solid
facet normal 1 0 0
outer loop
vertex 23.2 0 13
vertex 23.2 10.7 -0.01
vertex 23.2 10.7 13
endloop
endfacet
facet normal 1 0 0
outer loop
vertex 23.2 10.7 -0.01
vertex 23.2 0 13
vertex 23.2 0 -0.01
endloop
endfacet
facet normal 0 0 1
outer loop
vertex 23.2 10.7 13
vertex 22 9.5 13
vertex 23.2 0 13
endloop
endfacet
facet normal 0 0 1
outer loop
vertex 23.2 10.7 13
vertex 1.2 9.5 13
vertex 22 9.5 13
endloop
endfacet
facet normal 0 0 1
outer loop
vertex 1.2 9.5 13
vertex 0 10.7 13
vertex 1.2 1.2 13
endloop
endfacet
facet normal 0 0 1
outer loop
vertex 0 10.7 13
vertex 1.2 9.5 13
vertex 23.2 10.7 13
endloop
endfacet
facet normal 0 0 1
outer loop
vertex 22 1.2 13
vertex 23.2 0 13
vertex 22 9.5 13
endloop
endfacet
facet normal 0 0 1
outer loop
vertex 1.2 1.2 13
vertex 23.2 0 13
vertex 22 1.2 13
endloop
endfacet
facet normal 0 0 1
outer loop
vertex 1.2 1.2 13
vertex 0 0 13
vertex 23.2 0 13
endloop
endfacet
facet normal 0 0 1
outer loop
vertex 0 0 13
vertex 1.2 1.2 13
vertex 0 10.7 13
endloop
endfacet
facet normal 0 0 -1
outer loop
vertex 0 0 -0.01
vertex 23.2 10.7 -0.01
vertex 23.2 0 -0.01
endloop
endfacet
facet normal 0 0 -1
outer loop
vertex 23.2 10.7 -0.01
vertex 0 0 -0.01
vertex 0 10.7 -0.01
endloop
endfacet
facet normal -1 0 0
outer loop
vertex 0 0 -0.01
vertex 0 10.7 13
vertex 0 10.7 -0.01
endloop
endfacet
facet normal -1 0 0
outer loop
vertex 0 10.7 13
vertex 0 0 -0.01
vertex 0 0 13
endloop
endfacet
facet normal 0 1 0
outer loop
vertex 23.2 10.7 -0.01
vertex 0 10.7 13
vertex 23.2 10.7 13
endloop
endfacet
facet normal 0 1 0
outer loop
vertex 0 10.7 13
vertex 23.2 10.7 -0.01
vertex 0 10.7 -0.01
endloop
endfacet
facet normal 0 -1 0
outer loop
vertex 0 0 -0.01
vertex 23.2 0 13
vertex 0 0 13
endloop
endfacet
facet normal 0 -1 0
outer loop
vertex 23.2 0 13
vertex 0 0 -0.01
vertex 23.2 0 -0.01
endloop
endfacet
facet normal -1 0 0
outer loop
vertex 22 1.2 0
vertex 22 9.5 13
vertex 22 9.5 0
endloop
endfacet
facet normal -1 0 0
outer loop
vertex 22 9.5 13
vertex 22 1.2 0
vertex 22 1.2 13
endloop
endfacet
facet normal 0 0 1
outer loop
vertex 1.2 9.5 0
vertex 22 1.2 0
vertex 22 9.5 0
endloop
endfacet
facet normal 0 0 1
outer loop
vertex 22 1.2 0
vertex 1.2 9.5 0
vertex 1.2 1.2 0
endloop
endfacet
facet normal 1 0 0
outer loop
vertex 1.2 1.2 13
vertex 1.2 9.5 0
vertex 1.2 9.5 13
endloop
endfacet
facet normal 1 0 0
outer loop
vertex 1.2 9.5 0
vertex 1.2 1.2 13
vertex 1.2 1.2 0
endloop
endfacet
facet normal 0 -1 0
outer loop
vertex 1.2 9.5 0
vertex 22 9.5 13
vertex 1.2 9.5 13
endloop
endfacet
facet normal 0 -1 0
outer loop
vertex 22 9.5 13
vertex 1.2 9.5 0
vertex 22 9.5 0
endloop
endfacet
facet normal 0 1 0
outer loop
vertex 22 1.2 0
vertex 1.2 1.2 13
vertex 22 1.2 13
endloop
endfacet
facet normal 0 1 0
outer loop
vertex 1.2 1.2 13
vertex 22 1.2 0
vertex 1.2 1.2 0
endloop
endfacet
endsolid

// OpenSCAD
// file: ../Base/Rotation.scad
// Fischertechnik Box Foundation
// Geometry Helpers Rotation

include <PlacementOptions.scad>

// getRotatedSpace(space, rotation=NoRotation)
// Rotates the space dependent on the specified rotation

function getRotatedSpace(space, rotation=NoRotation) = [
    (rotation == Rotate90 || rotation == Rotate270) ? space.y : space.x,
    (rotation == Rotate90 || rotation == Rotate270) ? space.x : space.y
];

// Rotates the given space around the fixed left lower corner
// space = the space the children needs as width/depth list [width,depth]
// rotation = 0 Rotate0 degrees, 1 Rotate90 degrees, 2 Rotate180 degrees, 3 Rotate270 degrees (equivalent to -90)

module RotateFix(space, rotation=NoRotation) {
    dy = (rotation == Rotate0 || rotation == Rotate270) ? 0 :
        (rotation == Rotate90) ? space.x :
        space.y;
    dx = (rotation < Rotate180) ? 0 :
        (rotation == Rotate180) ? space.x :
        space.y;
    
    translate([dx, dy, 0])
        rotate([0, 0, rotations[rotation]])
            children();
}
// file: ../Base/Alignment.scad
// Fischertechnik Box Foundation
// Geometry Helpers Alignment

include <PlacementOptions.scad>

// getAlignedX(elementWidth, spaceWidth, align=AlignRight, offset=0)
// Gets the aligned X offset of an element with the given
// width in the given space.
// elementWidth = The width of the element to positon
// spaceWidth = The space where the element should be aligned
// align = 0 AlignLeft, 1 AlignCenter, 2 AlignRight
// offset = an optional offset from the aligned position. When
// aligned left or centered, then positive values are in X direction.
// When aligned right then positive values are in negative X direction.

function getAlignedX(elementWidth, spaceWidth, align=AlignRight, offset=0) =
    (align == AlignLeft) ?
        offset :
        ((align == AlignCenter) ?
        (spaceWidth - elementWidth)/2 + offset :
        spaceWidth - offset - elementWidth);

// getAlignedY(elementDepth, spaceDepth, align=AlignTop, offset=0)
// Gets the aligned Y offset of an element with the given
// depth in the given space.
// elementDepth = The depth of the element to positon
// spaceDepth = The space where the element should be aligned
// align = 0 AlignBottom, 1 AlignCenter, 2 AlignTop
// offset = an optional offset from the aligned position. When
// aligned bottom or centered, then positive values are in Y direction.
// When aligned top then positive values are in negative Y direction.

function getAlignedY(elementDepth, spaceDepth, align=AlignTop, offset=0) =
    (align == AlignBottom) ?
        offset :
        ((align == AlignCenter) ?
        (spaceDepth - elementDepth)/2 + offset :
        spaceDepth - offset - elementDepth);
// file: ../Base/PlacementOptions.scad
// Fischertechnik Box Foundation
// Placement Options

// Alignment
NoAlign = 0;
AlignLeft = 1;
AlignBottom = 2;
AlignCenter = 3;
AlignRight = 4;
AlignTop = 5;

// Element rotation degree steps
rotations = [0, -90, -180, -270];

// Rotation
NoRotation = 0;
Rotate0 = 0;
Rotate90 = 1;
Rotate180 = 2;
Rotate270 = 3;

// Docking (seen from above)
NoDock = -1;
DockLeft = 0;
DockTop = 1;
DockRight = 2;
DockCorner = 2;
DockBottom = 3;

// Web corners
LowerLeft = 0;
UpperLeft = 1;
UpperRight = 2;
LowerRight = 3;

// Web position relative to corner
LeftOfCorner = 0;
RightOfCorner = 1;
// file: ../Base/Boxes.scad
// Fischertechnik Box Foundation
// Pre-designed Boxes

use <Constants.scad>

include <PlacementOptions.scad>

box190Width = 190;
box190Depth = 130;
box130Width = 130;
box130Depth = 95;

// Values are from an original ec3 box
topBottomDifference = 1.5;
outerHeight = 40;
innerHeight = 38.2;
baseThickness = outerHeight - innerHeight;
stackExcess = 5.7;
radius = 3.5;
wallThickness = 1.5;
tolerance = 0.2;
stackOffset = innerHeight - stackExcess;

boxUsageHeight = stackOffset;
boxWallThickness = wallThickness;
boxBaseThickness = baseThickness;
boxWebWidth = 3.0;

// getBoxWallThickness()
// Gets the wall thickness of a Fischertechnik Box
function getBoxWallThickness() = boxWallThickness;

// getBoxUsageHeight()
// Gets the usable height of a Fischertechnik box
function getBoxUsageHeight() = boxUsageHeight;

// getBoxInnerHeight()
// Gets the inner height of a Fischertechnik box, including the stack excess
function getBoxInnerHeight() = innerHeight;

// getBoxBaseThickness()
// Gets the thickness of the Fischertechnik box base.
function getBoxBaseThickness() = boxBaseThickness;

// getBoxWebWidth()
// Gets the width of a box web
function getBoxWebWidth() = boxWebWidth;

// getBox190Space()
// Gets the usable inner space of a Box 190 as an x/y-list
function getBox190Space() = [
    box190Width - 2*getBoxWallThickness() - topBottomDifference, 
    box190Depth - 2*getBoxWallThickness() - topBottomDifference ];

// BoxBase(width, depth)
// Creates an empty stackable Fischertechnik compatible box
// width = Outer width of the box (190, 130, ...)
// depth = Outer depth of the box (130, 95, ...)

module BoxBase(width, depth, height=outerHeight) {    
    thinPlate = 0.01;

    innerHeight = height - baseThickness;    
    
    module BodyPlate(width, depth) {
        translate([radius, radius])
        hull() {
            w = width-2*radius;
            d = depth-2*radius;
            cube([w, d, thinPlate]);
            cylinder(thinPlate, r=radius, $fn=getFragments());
            translate([w, 0])
                cylinder(thinPlate, r=radius, $fn=getFragments());
            translate([w, d])
                cylinder(thinPlate, r=radius, $fn=getFragments());
            translate([0, d])
                cylinder(thinPlate, r=radius, $fn=getFragments());
        }
    }
    
    module Body(tolerance=tolerance) {
        hull() {
            // Bottom with tolerance to fit into the original boxes when stacked
            translate([-wallThickness+tolerance, -wallThickness+tolerance, -baseThickness])
                BodyPlate(width-topBottomDifference-2*tolerance, depth-topBottomDifference-2*tolerance);
            
            // Top
            translate([-wallThickness-topBottomDifference/2, -wallThickness-topBottomDifference/2, innerHeight-thinPlate])
                BodyPlate(width, depth);
         }
    }

    module Cutoff() {
        hull() {
            coWidth = width - 2*wallThickness;
            coDepth = depth - 2*wallThickness;
            
            // Bottom
            BodyPlate(coWidth-topBottomDifference, coDepth-topBottomDifference);

            // Top
            translate([-topBottomDifference/2, -topBottomDifference/2, innerHeight+thinPlate]) 
                BodyPlate(coWidth, coDepth);
        }
    }
    
    difference() {        
        Body();
        Cutoff();
        stackOffset = innerHeight - stackExcess;
        translate([0, 0, stackOffset + baseThickness])
            Body(tolerance=0);
    }
}

// Creates the Fischertechnik empty box 130x190 mm and places it at position 0,0
// 190x130 are the outer sizes, the inner space is slightly smaller. Use getBox190Space() to get the inner sizes.
// The box is positioned that the usable inner space is at the 0,0,0 position. The

module Box190() {
    BoxBase(box190Width, box190Depth);
}

// Gets the usable inner space of a Box 130 as an x/y-list
function getBox130Space() = [
    box130Width - 2*getBoxWallThickness() - topBottomDifference, 
    box130Depth - 2*getBoxWallThickness() - topBottomDifference ];

// Creates the Fischertechnik empty box 95x130 mm and places it at position 0,0
// 190x130 are the outer sizes, the inner space is slightly smaller. Use getBox190Space() to get the inner sizes.
// The box is positioned that the usable inner space is at the 0,0,0 position. The

module Box130() {
    BoxBase(box130Width, box130Depth);
}

// Creates a web at the specified box walls
// corner 0 = LowerLeft, 1 = UpperLeft, 2 = UpperRight, 3 = LowerRight
// side 0 = LeftOfCorner, 1 = RightOfCorner
// distance = Distance in mm from the corner
// boxSpace = inner width and depth of the box (default: Box 190)
// webWidth = length of the web (default is 3 mms)
// webThickness = thickness of the web (default is 1 mm)

module BoxWeb(corner, side, distance, boxSpace=getBox190Space(), webWidth=getBoxWebWidth(), webThickness=1.0) {
    sink = getBoxWallThickness()/2;

    width = (corner % 2 == 0) ? 
            (side == LeftOfCorner ? webWidth : webThickness) :
            (side == LeftOfCorner ? webThickness : webWidth);

    depth = (corner % 2 == 0) ? 
            (side == RightOfCorner ? webWidth : webThickness) :
            (side == RightOfCorner ? webThickness : webWidth);
    
    xDiff = corner == LowerLeft ? 
                (side == LeftOfCorner ? -sink : distance) :
            (corner == UpperLeft ?                
                (side == LeftOfCorner ? distance : -sink) :
            (corner == UpperRight ?
                (side == LeftOfCorner ? boxSpace.x-webWidth+sink : boxSpace.x-distance-webThickness) :
                (side == LeftOfCorner ? boxSpace.x-distance-webThickness: boxSpace.x-webWidth+sink)));

    yDiff = corner == LowerLeft ? 
                (side == RightOfCorner ? -sink : distance) :
            (corner == UpperLeft ?
                (side == RightOfCorner ? boxSpace.y-distance : boxSpace.y-webWidth+sink) :
            (corner == UpperRight ?
                (side == RightOfCorner ? boxSpace.y-webWidth+sink : boxSpace.y-distance) :
                (side == RightOfCorner ? distance : -sink)));
    
    translate([xDiff, yDiff, -getExcess()])
        cube([width, depth, boxUsageHeight + 2*getExcess()]);
}
// file: ../Base/Placement.scad
// Fischertechnik Box Foundation
// Geometry Helpers Placement

use <Constants.scad>
use <Alignment.scad>
use <Rotation.scad>
use <Boxes.scad>

include <PlacementOptions.scad>

// Place(x=0, y=0, elementSpace=[0,0], alignX=AlignLeft, alignY=AlignBottom, rotation=Rotate0, boxSpace=getBox190Space())
// Places the child at the specified position
// y = Y-Position. This is a relative position when an X aligment is specified.
// x = X-Position. This is a relative position when an Y aligment is specified.
// elementSpace = space of the element to be placed [x,y]
// alignX = -1=NoAlign, 0 AlignLeft, 1 AlignCenter, 3 AlignRight (elementSpace and boxSpace required!)
// alignY = -1=NoAlign, 2 AlignBottom, 1 AlignCenter, 4 AlignTop (elementSpace and boxSpace required!)
// rotation = 0 Rotate0 0 degrees, 1 Rotate90 90 degrees, 
// 2 Rotate180 180 degrees, 3 Rotate270 270 degrees (equivalent to -90)
// boxSpace = Inner space of the box where the placement occurs [x,y] - default is Box 190x130 inner space

module Place(x=0, y=0, elementSpace=[0,0], 
  alignX=AlignLeft, alignY=AlignBottom, 
  rotation=NoRotation, boxSpace=getBox190Space()) {

    module Position(x, y, space, rotation=Rotate0) {
        translate([x, y, 0])
            RotateFix(space, rotation)
                children();
    }

    space = getRotatedSpace(elementSpace, rotation);
    alignedX = getAlignedX(space.x, boxSpace.x, alignX, x);
    alignedY = getAlignedY(space.y, boxSpace.y, alignY, y);
    Position(alignedX, alignedY, elementSpace, rotation)
        children();
}

// Center(space=getBox130Space(), elementSpace=[0,0])
// space = Space where the children is centered. For cylinder use centered=true and no elementSpace.
// elementSpace = space of the element to be centered [x,y]

module Center(space=getBox190Space(), elementSpace=[0,0]) {
    Place(elementSpace=elementSpace, boxSpace=space, alignX=AlignCenter, alignY=AlignCenter)
        children();
}

// CenterHorizontal(width=0, y=0, offset=0, space=getBox130Space())
// width = Width of the element to be placed.
// y = Y position of the element
// offset = Offset from the center position (negative will be left of the center)
// space = Space where the element is placed

module CenterHorizontal(width=0, y=0, offset=0, space=getBox190Space()) {
    Place(x=offset, y=y, elementSpace=[width, 0], boxSpace=space, alignX=AlignCenter)
        children(0);
}

// CenterVertical(depth=0, x=0, offset=0, space=getBox130Space())
// depth = Depth of the element to be placed.
// x = X position of the element
// offset = Offset from the center position (negative will be down of the center)
// space = Space where the element is placed

module CenterVertical(depth=0, x=0, offset=0, space=getBox190Space()) {
    Place(x=x, y=offset, elementSpace=[0, depth], boxSpace=space, alignY=AlignCenter)
        children(0);
}

// getIsVertical(align)
// True if the specified alignment needs a vertical orientation for a divider (AlignRight, AlignLeft)

function getIsVertical(align) = (align == AlignRight || align == AlignLeft);

// getIsHorizontal(align)
// True if the specified alignment needs a horizontal orientation for a divider (AlignTop, AlignBottom)

function getIsHorizontal(align) = (align == AlignTop || align == AlignBottom);
// file: ../Base/Constants.scad
// Fischertechnik Box Foundation
// Constants

// Constant values necessary for multiple elements

// Base constants
dividerThickness = 1.2;
excess = 0.01;
fragments = 90;
tolerance = 0.8;

// Gets the thickness of a divider 
function getDividerThickness() = dividerThickness;

// Gets the excess that is used to merge walls into each other
function getExcess() = excess;

// Gets amount of fragments of a cylinder
function getFragments() = fragments;

// Gets the inner tolerance of a frame to each side
function getTolerance() = tolerance;


// Fischertechnik specific constants
axisDiameter = 4;
axisBottomDiameter = axisDiameter + 1;
standardEdgeDistance = 2.5;
standardWebDistance = 11.5;
standardCornerLength = 15;
tubeWallFactor = 0.8;
smallPartsFrameHeight = 20;

// Gets axis diameter
function getAxisDiameter() = axisDiameter;

// Gets axis bottom diameter for thicker part at the bottom
function getAxisBottomDiameter() = axisBottomDiameter;

// gets the standard distance to the wall of the box for dockable frames with webs
function getStandardEdgeDistance() = standardEdgeDistance;

// gets the standard distance of each web to the corner of the dockable frame
function getStandardWebDistance() = standardWebDistance;

// gets the standard length of the corner walls of a dockable frame
function getStandardCornerLength() = standardCornerLength;

// gets the wall thickness of a tube.
function getTubeWallThickness() = tubeWallFactor * getDividerThickness();

// gets the frame height for docked small parts boxes.
function getSmallPartsFrameHeight() = smallPartsFrameHeight;
// main file
// Fischertechnik Box Library
// Frame for Locking Ring
// 31020

use <../Base/Constants.scad>
use <../ModelBase/Simple.scad>

/* [Element Parameters] */
columns = 1;
rows = 1;

/* [Hidden] */
width = 20;
depth = 7.5;
height = 13;

// getFrameLockingRingSpace(columns=1, rows=1)
// columns = Count of locking rings in X direction (width of ring)
// rows = Count of locking rings in Y direction (depth of ring)
// Gets the space the frame locking ring needs as width (.x and .y as a list)

function getFrameLockingRingSpace(columns=1, rows=1) = getFrameOuterVolume([width*columns, depth*rows, height]);

// FrameLockingRing(columns, rows, smallSideIsX)
// columns = Count of locking rings in X direction (width of ring)
// rows = Count of locking rings in Y direction (depth of ring)
// The walls of the frame are 13 mm high. The small side is 7.5 mm wide, the large side
// is 20 mm wide.

module FrameLockingRing(columns=1, rows=1) {
    Frame([width*columns, depth*rows, height]);
}

// Tests
color("lightgray")
    FrameLockingRing(columns, rows);
